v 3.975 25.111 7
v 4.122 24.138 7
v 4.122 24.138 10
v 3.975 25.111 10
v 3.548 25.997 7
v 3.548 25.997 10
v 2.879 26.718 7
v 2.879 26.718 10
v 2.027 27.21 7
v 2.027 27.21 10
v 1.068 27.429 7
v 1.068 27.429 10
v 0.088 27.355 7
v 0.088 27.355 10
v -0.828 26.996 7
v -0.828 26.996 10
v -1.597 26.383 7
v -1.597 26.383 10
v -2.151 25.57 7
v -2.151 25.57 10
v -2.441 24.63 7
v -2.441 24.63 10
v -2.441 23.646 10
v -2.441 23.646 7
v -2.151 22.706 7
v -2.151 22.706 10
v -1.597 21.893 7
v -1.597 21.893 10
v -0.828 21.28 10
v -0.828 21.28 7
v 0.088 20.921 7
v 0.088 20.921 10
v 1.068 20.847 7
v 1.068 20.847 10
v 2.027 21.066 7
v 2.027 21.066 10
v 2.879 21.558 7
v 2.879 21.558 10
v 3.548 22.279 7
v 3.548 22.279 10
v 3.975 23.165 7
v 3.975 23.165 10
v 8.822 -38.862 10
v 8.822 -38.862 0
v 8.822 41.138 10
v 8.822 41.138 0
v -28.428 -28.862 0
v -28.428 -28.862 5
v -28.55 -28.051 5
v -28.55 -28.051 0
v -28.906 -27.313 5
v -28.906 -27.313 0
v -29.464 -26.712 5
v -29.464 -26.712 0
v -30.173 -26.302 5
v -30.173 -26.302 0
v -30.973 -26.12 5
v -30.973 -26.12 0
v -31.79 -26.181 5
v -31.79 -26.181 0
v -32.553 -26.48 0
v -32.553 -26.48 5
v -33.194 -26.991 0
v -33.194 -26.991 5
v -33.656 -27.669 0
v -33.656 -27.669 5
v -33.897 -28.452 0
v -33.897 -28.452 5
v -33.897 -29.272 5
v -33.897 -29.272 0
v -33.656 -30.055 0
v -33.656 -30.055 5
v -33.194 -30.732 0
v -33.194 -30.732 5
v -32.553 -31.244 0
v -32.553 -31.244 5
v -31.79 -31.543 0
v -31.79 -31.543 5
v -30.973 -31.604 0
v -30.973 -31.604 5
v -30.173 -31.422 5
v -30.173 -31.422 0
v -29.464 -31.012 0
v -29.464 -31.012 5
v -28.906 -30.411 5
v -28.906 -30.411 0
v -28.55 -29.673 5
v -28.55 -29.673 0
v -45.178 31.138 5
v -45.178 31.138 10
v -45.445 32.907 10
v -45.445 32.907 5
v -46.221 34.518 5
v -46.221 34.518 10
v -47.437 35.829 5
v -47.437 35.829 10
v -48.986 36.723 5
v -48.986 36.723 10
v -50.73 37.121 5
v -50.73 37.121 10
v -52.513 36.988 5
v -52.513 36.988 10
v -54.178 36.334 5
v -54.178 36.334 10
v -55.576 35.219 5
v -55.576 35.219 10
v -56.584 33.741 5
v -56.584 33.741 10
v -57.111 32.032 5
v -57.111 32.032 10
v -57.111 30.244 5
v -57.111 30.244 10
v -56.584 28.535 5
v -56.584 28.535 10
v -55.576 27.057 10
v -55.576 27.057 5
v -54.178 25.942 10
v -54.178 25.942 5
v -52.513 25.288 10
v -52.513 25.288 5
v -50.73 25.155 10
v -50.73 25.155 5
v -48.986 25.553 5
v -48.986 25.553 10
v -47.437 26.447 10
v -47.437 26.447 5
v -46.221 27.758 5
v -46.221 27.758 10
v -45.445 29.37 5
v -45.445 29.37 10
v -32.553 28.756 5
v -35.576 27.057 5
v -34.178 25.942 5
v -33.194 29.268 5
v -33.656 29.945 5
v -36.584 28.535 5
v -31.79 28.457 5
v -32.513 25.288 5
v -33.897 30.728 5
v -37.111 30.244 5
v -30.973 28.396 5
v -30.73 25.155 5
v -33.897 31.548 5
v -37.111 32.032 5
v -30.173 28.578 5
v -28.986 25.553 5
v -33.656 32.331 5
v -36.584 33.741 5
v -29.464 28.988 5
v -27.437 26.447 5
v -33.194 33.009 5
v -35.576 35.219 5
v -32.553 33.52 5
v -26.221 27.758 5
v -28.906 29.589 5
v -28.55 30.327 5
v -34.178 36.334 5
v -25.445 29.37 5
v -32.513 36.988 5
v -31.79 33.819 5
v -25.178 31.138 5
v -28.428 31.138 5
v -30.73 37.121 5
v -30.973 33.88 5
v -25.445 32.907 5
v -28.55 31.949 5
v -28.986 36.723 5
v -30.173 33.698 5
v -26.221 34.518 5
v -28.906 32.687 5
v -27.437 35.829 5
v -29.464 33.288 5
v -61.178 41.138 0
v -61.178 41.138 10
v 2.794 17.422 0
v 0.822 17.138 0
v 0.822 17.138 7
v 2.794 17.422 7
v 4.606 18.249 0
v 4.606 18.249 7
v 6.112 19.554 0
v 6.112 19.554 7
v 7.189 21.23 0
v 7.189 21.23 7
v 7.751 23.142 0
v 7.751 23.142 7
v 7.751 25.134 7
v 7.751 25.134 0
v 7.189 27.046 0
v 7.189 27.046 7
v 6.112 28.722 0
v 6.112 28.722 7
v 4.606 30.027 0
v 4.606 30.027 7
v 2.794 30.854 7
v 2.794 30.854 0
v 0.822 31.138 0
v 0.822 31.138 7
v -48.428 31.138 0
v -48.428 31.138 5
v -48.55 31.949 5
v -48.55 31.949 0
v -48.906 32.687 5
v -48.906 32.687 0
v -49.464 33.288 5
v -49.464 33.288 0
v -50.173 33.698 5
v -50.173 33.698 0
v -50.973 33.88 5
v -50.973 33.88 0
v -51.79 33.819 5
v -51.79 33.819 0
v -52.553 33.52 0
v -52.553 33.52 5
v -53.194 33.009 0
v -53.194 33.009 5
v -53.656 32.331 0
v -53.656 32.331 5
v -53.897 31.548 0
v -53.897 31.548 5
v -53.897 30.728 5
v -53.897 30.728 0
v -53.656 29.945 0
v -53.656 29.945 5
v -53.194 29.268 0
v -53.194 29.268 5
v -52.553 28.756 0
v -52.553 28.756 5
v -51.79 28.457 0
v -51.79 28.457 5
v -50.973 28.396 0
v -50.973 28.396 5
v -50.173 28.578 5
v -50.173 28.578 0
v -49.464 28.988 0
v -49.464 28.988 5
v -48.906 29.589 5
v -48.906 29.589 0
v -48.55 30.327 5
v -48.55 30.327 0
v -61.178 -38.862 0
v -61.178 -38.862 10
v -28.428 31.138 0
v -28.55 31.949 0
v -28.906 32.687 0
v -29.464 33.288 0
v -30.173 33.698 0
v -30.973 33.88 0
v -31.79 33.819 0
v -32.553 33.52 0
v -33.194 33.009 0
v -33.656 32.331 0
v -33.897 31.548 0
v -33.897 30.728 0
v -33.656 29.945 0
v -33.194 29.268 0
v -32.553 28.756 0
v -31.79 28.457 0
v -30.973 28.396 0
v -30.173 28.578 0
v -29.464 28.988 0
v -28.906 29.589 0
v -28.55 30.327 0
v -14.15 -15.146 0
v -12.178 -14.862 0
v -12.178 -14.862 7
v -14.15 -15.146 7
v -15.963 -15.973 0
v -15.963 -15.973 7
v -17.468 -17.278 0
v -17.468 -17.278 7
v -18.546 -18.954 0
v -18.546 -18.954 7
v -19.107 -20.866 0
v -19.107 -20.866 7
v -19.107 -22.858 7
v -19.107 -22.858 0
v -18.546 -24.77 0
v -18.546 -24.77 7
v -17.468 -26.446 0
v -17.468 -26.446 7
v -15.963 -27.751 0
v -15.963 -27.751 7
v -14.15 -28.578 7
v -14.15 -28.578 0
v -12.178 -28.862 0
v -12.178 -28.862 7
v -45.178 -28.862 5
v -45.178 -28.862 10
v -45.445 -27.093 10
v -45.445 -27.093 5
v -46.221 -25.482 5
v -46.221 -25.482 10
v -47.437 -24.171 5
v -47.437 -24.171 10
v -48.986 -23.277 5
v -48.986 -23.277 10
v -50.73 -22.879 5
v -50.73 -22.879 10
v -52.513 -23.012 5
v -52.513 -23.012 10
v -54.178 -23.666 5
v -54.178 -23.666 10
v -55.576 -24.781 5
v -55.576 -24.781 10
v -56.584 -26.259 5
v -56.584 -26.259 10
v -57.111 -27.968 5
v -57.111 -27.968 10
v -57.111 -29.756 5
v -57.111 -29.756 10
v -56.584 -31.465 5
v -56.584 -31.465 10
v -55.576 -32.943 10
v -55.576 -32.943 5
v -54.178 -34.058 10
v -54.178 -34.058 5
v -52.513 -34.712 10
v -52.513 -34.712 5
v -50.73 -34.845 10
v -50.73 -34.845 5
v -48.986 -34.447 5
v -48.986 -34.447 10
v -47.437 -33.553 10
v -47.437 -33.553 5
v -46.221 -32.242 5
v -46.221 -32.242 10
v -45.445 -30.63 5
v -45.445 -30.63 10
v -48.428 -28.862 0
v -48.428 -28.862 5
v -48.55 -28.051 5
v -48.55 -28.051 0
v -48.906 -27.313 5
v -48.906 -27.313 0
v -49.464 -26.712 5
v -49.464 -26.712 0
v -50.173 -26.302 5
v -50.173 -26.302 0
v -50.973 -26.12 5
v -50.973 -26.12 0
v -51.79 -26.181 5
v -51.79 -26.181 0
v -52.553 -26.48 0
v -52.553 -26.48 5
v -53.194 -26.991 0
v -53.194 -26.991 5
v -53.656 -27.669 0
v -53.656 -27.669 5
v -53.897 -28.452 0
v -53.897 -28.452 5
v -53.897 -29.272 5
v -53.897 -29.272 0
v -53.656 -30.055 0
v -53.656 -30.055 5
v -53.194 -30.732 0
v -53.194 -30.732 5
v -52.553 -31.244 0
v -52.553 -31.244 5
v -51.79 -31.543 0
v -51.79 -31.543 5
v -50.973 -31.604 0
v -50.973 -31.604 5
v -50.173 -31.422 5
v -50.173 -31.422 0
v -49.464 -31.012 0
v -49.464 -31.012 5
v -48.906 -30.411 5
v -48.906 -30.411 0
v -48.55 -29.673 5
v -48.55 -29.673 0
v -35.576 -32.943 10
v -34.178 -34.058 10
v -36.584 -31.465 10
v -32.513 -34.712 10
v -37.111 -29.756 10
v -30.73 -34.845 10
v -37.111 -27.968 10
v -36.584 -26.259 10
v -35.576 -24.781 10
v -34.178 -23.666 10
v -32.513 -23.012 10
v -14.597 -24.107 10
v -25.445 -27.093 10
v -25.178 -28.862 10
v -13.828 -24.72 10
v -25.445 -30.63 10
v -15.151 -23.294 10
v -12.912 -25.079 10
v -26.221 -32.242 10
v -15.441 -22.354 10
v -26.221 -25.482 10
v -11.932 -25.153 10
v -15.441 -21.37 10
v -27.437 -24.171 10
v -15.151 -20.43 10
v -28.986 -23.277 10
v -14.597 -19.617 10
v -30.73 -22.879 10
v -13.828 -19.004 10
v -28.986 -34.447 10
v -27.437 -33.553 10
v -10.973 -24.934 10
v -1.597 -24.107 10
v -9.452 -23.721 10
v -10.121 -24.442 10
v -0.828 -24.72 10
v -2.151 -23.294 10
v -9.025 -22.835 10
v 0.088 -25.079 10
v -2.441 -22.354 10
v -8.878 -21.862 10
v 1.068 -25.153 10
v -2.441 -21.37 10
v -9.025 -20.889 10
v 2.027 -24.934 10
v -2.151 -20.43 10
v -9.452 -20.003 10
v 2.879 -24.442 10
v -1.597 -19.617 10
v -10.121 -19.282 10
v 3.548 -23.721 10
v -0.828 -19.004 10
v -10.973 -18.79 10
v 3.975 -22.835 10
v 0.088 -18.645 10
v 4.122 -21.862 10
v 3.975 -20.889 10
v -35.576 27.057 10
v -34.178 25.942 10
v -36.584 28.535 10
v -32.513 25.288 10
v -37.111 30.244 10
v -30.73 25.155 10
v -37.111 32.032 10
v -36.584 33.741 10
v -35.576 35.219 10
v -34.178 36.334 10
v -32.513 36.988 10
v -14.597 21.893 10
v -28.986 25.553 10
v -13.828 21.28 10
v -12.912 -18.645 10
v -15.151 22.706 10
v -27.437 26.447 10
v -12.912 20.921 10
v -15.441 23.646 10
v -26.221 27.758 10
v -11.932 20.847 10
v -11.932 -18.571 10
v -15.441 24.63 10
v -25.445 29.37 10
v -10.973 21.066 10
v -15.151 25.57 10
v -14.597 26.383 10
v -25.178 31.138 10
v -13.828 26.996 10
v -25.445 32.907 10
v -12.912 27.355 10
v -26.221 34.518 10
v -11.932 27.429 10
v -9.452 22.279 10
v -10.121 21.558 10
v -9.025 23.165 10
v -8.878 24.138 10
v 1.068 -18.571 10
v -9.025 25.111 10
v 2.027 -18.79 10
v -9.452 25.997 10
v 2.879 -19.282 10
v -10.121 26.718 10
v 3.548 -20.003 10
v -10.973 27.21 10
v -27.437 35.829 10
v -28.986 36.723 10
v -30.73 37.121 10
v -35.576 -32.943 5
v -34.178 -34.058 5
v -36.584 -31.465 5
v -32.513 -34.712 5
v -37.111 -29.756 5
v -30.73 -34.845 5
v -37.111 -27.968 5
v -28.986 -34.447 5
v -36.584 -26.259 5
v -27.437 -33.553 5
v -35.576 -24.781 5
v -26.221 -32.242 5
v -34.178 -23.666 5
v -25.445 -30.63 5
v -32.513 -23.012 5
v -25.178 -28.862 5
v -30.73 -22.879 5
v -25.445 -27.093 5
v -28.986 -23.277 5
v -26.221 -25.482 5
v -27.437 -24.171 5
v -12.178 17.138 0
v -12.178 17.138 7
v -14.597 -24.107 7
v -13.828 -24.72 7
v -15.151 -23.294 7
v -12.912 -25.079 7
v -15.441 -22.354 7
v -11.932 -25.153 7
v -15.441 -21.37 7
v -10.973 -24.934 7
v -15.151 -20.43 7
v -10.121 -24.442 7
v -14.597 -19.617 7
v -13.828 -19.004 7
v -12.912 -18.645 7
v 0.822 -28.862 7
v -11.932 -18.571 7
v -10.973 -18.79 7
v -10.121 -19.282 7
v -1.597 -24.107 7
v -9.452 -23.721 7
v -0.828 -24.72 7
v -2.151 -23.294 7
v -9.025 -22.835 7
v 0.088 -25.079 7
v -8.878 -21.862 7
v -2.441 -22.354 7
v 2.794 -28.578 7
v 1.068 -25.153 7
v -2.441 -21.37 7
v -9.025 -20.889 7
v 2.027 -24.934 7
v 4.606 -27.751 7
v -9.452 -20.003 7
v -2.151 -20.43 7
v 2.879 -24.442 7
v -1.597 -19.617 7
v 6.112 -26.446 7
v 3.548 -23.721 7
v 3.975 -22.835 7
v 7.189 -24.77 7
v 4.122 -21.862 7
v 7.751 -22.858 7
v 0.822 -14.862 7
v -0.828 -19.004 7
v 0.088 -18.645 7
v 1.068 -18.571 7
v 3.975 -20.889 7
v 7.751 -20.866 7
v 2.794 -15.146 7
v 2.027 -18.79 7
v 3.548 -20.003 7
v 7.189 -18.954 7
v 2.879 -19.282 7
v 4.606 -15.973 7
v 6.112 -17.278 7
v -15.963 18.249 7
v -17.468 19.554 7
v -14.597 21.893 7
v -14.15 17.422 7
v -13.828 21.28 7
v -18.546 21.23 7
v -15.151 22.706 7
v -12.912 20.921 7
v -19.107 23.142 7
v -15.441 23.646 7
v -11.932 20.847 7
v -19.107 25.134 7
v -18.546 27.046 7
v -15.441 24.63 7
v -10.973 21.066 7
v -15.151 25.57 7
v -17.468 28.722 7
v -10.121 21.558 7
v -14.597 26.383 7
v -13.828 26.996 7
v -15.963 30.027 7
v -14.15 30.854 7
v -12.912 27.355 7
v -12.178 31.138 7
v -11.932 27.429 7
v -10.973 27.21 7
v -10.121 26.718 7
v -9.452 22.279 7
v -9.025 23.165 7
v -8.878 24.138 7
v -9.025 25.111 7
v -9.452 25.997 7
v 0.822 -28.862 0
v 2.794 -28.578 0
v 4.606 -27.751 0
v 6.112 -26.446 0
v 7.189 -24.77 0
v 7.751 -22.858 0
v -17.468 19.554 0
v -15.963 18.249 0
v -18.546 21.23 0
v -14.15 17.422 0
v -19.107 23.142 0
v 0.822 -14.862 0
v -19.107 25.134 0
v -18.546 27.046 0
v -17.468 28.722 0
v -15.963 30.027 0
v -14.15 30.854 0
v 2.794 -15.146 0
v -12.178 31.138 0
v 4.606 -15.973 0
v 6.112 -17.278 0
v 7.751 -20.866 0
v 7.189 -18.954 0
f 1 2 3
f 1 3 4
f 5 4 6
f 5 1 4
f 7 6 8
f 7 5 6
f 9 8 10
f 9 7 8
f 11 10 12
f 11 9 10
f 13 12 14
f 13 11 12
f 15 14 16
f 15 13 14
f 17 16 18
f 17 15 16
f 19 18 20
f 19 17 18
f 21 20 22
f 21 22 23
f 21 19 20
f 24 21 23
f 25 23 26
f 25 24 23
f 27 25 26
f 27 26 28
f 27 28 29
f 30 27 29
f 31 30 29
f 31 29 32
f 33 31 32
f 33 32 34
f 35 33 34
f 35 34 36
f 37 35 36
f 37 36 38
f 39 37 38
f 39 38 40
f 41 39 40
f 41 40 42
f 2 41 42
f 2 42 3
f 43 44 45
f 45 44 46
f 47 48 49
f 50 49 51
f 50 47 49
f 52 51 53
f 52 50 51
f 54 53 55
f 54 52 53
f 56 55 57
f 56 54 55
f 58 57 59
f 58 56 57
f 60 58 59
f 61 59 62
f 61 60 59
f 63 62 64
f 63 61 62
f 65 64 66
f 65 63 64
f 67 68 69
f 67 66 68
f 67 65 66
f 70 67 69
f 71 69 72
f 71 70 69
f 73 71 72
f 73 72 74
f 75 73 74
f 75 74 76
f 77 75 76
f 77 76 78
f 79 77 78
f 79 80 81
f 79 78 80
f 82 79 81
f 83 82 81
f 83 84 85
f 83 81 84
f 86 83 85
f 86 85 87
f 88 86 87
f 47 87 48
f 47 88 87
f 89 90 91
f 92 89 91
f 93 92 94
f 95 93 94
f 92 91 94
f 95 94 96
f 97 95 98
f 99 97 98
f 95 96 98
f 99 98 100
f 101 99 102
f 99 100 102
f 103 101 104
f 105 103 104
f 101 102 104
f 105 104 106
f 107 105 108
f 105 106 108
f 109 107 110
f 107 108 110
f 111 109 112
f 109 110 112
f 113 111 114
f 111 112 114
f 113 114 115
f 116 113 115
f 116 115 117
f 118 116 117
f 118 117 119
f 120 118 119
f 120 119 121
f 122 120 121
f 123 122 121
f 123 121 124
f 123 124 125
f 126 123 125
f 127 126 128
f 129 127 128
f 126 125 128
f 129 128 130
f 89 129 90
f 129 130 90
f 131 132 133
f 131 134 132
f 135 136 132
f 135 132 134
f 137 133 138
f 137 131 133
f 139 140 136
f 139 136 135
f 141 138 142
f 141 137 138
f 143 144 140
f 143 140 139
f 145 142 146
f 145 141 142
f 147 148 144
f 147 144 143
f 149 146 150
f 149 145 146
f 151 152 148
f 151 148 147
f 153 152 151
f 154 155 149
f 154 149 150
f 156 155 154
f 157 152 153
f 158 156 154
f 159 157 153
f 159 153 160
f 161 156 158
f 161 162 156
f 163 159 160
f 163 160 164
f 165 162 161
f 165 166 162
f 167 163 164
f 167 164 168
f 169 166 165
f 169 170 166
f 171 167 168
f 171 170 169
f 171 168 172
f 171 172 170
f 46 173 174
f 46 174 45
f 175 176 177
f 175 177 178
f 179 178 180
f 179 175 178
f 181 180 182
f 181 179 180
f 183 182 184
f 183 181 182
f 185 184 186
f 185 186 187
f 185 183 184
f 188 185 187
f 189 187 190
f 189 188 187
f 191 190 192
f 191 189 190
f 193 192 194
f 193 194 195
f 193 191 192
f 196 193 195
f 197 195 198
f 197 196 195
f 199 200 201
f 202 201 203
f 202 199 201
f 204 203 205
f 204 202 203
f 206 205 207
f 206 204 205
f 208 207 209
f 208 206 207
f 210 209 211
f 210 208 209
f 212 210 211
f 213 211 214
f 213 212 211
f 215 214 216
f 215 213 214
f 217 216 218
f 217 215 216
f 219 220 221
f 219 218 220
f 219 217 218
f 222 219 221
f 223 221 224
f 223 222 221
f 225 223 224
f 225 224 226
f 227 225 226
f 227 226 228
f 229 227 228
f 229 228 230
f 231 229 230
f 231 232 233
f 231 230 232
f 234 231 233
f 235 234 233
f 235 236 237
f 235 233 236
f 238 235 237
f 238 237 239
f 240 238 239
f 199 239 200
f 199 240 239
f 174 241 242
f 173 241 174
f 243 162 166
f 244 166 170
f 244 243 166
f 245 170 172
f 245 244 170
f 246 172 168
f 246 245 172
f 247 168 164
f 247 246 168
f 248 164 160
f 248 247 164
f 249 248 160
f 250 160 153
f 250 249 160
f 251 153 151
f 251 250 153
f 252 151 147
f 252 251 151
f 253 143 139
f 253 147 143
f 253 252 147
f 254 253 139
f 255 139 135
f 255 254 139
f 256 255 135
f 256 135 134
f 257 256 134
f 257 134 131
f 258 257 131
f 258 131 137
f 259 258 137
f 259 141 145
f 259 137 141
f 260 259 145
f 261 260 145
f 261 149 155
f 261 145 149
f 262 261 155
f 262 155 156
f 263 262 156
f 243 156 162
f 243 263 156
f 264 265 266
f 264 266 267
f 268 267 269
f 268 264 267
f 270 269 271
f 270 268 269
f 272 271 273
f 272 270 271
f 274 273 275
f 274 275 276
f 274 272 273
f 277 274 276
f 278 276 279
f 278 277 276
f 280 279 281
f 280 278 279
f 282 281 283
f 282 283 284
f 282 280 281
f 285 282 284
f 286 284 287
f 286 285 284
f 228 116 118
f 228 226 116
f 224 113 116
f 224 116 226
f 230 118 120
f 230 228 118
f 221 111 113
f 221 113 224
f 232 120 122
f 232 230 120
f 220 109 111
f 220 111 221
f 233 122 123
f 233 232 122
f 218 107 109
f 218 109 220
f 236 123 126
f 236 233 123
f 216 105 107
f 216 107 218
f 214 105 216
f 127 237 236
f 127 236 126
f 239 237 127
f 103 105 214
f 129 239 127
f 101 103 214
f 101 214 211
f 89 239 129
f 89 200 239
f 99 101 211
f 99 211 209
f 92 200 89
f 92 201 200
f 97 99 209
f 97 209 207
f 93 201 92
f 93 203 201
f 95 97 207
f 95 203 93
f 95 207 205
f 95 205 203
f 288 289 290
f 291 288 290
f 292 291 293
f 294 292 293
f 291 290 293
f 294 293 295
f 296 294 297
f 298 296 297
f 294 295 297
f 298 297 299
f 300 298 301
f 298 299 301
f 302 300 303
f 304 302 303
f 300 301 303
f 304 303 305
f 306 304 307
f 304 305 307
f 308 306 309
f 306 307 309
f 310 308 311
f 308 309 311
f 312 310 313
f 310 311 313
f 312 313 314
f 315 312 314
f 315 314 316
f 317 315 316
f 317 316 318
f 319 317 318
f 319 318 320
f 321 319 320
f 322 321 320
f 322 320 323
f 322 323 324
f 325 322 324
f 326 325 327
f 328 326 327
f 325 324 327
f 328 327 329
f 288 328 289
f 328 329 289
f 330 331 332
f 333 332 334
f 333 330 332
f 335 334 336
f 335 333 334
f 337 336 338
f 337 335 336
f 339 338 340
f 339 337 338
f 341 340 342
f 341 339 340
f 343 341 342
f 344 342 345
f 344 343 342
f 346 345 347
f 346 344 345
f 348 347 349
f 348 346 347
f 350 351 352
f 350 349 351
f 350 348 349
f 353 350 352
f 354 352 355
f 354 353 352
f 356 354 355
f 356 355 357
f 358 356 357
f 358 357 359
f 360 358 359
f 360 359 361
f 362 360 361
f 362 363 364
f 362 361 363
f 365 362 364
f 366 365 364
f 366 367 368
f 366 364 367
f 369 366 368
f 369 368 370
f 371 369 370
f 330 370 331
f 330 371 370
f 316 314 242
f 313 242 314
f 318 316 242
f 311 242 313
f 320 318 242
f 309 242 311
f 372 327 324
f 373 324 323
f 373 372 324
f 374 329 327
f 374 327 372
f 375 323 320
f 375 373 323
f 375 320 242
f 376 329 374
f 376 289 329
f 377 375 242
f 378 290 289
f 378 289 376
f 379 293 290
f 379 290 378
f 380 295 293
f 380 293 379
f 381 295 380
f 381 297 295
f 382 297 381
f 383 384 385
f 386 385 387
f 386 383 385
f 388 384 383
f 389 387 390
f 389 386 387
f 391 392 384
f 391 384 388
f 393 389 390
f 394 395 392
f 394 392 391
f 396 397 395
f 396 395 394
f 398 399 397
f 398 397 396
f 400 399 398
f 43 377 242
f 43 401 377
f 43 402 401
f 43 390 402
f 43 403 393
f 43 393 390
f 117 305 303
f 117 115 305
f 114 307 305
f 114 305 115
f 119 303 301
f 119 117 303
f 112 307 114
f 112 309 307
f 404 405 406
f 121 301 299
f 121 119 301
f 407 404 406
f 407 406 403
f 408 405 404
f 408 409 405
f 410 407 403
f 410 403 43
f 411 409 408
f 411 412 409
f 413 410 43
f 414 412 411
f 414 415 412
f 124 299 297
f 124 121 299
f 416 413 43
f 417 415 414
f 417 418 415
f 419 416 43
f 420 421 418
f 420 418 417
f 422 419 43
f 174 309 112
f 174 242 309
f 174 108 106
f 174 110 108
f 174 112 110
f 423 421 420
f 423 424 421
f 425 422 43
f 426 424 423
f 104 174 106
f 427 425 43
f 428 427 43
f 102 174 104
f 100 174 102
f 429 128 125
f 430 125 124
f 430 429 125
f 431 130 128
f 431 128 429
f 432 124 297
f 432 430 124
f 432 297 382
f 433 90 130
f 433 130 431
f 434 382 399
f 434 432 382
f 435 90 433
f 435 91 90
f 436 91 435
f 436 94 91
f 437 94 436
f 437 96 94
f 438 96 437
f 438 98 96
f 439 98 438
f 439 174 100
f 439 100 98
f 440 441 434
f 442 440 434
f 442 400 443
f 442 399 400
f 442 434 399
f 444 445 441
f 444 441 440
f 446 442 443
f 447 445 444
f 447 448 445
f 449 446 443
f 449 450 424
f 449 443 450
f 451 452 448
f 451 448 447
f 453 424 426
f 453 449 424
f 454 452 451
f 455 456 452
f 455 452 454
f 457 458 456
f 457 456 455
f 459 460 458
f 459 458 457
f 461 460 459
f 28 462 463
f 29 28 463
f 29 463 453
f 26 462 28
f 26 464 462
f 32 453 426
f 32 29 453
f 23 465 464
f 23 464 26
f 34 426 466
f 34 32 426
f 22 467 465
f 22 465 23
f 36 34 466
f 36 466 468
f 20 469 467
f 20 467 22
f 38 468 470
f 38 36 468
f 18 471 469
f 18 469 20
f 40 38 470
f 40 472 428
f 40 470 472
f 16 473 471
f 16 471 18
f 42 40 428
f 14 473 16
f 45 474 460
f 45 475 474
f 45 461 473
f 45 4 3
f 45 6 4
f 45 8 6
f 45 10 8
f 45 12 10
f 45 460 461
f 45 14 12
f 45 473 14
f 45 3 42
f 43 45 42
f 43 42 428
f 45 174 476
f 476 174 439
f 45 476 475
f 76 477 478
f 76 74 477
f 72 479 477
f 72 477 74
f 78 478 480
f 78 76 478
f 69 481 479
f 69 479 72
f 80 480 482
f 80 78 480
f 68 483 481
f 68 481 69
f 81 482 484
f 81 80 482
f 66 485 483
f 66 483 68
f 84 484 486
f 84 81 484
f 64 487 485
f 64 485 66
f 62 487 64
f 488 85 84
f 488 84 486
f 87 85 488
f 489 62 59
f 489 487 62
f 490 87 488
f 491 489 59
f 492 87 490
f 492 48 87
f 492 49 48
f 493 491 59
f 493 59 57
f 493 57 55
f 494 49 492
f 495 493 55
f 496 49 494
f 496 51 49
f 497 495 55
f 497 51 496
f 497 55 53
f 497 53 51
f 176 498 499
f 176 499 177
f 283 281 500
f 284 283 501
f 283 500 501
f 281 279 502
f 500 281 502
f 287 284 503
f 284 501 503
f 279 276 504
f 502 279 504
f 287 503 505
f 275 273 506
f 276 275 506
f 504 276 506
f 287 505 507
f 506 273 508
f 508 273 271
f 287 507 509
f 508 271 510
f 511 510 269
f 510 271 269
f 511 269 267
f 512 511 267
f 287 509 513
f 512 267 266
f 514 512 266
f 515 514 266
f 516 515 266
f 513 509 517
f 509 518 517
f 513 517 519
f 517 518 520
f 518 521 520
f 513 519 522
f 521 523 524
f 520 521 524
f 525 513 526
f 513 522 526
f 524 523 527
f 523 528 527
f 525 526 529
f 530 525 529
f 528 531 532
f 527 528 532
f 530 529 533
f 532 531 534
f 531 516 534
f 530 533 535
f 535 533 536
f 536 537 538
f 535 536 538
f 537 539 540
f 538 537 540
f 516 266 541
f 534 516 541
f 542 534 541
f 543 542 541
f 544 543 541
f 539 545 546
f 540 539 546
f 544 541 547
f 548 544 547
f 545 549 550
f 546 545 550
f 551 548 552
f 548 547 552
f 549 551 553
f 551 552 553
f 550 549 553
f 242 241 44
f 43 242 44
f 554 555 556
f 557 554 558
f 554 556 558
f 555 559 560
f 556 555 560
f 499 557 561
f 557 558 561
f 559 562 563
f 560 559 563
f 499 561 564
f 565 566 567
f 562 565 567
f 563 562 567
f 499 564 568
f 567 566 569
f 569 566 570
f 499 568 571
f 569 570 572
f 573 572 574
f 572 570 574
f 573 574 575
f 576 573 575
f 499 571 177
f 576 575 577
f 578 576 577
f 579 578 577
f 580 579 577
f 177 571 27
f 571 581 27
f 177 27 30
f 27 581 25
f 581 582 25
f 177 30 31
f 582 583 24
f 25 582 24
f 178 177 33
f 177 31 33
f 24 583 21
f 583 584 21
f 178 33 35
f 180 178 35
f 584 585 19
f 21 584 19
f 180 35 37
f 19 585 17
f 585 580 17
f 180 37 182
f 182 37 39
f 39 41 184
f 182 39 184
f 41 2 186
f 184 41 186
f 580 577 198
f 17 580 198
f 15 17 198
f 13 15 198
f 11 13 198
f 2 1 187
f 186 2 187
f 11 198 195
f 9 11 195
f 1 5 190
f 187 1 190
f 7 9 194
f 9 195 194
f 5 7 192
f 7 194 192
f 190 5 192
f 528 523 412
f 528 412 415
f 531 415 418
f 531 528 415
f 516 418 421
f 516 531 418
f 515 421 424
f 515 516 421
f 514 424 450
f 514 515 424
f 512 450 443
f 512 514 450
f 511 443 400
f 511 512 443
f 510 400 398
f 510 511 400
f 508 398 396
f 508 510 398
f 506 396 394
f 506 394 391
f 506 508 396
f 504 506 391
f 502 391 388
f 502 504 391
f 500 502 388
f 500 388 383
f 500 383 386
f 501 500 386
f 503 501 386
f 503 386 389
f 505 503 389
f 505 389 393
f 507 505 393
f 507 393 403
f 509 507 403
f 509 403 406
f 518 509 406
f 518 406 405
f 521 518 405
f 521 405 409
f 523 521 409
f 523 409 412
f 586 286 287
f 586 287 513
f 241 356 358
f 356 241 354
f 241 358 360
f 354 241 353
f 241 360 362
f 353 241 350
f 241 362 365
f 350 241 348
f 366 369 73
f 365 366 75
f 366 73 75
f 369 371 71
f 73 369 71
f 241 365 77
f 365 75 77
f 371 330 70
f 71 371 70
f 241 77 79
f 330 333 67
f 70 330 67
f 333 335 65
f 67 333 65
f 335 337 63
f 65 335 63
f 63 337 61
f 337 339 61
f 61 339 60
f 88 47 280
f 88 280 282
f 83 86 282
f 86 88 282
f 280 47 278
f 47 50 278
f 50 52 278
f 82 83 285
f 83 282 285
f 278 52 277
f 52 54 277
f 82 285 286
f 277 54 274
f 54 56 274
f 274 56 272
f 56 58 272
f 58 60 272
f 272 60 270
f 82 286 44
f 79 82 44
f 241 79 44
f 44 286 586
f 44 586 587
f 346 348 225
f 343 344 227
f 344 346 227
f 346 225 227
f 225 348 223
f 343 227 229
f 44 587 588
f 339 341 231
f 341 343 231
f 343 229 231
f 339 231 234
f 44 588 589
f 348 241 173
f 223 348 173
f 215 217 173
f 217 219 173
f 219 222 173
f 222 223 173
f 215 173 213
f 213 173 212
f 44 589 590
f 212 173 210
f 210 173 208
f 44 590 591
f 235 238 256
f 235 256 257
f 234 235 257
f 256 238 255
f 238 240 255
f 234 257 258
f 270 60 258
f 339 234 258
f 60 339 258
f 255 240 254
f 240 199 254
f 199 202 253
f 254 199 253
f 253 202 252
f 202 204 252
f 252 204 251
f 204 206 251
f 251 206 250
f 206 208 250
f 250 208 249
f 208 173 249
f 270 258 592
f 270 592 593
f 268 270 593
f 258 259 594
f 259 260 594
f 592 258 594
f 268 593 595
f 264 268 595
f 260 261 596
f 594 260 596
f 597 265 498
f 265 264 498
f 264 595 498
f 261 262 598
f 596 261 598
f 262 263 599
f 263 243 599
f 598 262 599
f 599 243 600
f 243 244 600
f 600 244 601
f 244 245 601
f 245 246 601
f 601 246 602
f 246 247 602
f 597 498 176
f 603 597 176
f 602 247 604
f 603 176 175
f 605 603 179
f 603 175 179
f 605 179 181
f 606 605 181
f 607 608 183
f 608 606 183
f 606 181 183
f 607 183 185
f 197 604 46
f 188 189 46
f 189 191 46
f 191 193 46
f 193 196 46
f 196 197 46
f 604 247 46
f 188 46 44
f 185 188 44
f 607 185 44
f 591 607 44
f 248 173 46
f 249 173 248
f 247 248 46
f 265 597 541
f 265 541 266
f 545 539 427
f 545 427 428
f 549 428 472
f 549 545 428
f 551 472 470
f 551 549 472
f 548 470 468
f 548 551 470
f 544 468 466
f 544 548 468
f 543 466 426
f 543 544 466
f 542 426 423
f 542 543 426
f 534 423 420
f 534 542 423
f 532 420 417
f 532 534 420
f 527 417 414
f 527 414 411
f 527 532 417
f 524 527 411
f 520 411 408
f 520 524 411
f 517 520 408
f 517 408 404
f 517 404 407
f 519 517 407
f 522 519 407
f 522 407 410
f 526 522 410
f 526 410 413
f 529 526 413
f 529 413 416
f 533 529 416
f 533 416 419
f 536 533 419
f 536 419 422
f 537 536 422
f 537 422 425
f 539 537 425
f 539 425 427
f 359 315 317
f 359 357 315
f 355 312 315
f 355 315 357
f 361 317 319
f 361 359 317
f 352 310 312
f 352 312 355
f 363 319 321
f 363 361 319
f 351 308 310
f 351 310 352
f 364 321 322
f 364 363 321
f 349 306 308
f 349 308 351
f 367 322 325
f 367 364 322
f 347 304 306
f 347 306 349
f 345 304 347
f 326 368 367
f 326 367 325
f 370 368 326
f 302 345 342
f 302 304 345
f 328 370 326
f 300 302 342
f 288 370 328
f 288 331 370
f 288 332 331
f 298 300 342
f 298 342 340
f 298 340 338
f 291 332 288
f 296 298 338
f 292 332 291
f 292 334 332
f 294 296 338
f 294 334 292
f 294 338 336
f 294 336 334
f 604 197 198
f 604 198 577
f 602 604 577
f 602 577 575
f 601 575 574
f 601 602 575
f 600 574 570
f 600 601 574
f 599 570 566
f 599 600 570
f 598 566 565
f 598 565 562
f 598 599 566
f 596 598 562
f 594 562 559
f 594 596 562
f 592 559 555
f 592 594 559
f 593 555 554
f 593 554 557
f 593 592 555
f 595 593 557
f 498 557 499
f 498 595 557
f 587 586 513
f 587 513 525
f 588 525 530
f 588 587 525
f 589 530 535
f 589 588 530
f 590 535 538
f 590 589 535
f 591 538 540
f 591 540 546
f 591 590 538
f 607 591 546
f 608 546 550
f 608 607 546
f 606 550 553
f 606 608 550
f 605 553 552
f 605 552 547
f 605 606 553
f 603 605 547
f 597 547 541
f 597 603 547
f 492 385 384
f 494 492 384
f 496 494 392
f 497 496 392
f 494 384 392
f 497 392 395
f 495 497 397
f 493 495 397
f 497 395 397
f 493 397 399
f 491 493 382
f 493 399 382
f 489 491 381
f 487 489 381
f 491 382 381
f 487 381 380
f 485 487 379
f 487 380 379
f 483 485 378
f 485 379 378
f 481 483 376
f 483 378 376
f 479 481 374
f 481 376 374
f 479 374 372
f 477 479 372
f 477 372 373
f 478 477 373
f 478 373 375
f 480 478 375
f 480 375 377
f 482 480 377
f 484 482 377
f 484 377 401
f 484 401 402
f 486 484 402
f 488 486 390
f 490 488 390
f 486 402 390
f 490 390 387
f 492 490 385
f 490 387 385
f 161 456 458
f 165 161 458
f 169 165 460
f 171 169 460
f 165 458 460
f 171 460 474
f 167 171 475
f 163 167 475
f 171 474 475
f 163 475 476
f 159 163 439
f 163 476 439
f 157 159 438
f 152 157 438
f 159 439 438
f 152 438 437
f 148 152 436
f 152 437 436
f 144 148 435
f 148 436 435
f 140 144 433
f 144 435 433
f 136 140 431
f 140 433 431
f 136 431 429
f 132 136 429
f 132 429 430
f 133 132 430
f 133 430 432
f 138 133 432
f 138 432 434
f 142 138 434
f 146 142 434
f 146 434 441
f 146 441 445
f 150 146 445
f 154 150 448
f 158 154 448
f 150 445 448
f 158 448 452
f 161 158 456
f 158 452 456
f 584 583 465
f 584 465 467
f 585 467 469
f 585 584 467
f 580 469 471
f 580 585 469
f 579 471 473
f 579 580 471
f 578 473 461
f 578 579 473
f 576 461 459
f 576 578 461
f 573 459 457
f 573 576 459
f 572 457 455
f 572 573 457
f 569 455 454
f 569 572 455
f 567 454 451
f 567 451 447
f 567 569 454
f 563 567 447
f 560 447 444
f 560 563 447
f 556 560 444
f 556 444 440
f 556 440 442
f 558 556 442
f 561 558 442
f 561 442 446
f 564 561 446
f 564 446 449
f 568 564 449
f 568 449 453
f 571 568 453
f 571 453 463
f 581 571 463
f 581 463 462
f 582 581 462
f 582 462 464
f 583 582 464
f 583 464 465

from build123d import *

# Parameters (mm, degrees)
ESQUISSE1_W             = 70
ESQUISSE1_H             = 80
ESQUISSE1_R             = 3.3
ESQUISSE1_R_2           = 2.75
BOSS_EXTRU_1_DEPTH      = 10
ESQUISSE2_R             = 6
ENL_V_MAT_EXTRU_1_DEPTH = 5
ENL_V_MAT_EXTRU_3_DEPTH = 7


with BuildPart() as part:
    # Esquisse1 → Boss.-Extru.1 (new body)
    with BuildSketch(Plane.XY):
        with Locations((-26.178136106, 1.138047212)):
            Rectangle(ESQUISSE1_W, ESQUISSE1_H)
        with Locations((0.821863894, 24.138047212)):
            Circle(ESQUISSE1_R, mode=Mode.SUBTRACT)
        with Locations((-12.178136106, 24.138047212)):
            Circle(ESQUISSE1_R, mode=Mode.SUBTRACT)
        with Locations((-12.178136106, -21.861952788)):
            Circle(ESQUISSE1_R, mode=Mode.SUBTRACT)
        with Locations((0.821863894, -21.861952788)):
            Circle(ESQUISSE1_R, mode=Mode.SUBTRACT)
        with Locations((-51.178136106, 31.138047212)):
            Circle(ESQUISSE1_R_2, mode=Mode.SUBTRACT)
        with Locations((-31.178136106, 31.138047212)):
            Circle(ESQUISSE1_R_2, mode=Mode.SUBTRACT)
        with Locations((-31.178136106, -28.861952788)):
            Circle(ESQUISSE1_R_2, mode=Mode.SUBTRACT)
        with Locations((-51.178136106, -28.861952788)):
            Circle(ESQUISSE1_R_2, mode=Mode.SUBTRACT)
    extrude(amount=BOSS_EXTRU_1_DEPTH)

    # Esquisse2 → Enlèv. mat.-Extru.1 (cut)
    with BuildSketch(Plane.XY.offset(10)):
        with Locations((-51.178136106, 31.138047212)):
            Circle(ESQUISSE2_R)
        with Locations((-31.178136106, 31.138047212)):
            Circle(ESQUISSE2_R)
        with Locations((-31.178136106, -28.861952788)):
            Circle(ESQUISSE2_R)
        with Locations((-51.178136106, -28.861952788)):
            Circle(ESQUISSE2_R)
    extrude(amount=-ENL_V_MAT_EXTRU_1_DEPTH, mode=Mode.SUBTRACT)

    # Esquisse3 → Enlèv. mat.-Extru.3 (cut)
    with BuildSketch(Plane(origin=(0, 0, 0), x_dir=(-1, 0, 0), z_dir=(0, 0, -1))):
        with BuildLine():
            Line((-0.821863894, 31.138047212), (12.178136106, 31.138047212))
            ThreePointArc((12.178136106, 31.138047212), (19.178136106, 24.138047212), (12.178136106, 17.138047212))
            Line((12.178136106, 17.138047212), (-0.821863894, 17.138047212))
            ThreePointArc((-0.821863894, 17.138047212), (-7.821863894, 24.138047212), (-0.821863894, 31.138047212))
        make_face()
        with BuildLine():
            Line((-0.821863894, -14.861952788), (12.178136106, -14.861952788))
            ThreePointArc((12.178136106, -14.861952788), (19.178136106, -21.861952788), (12.178136106, -28.861952788))
            Line((12.178136106, -28.861952788), (-0.821863894, -28.861952788))
            ThreePointArc((-0.821863894, -28.861952788), (-7.821863894, -21.861952788), (-0.821863894, -14.861952788))
        make_face()
    extrude(amount=-ENL_V_MAT_EXTRU_3_DEPTH, mode=Mode.SUBTRACT)


solid = part.part
